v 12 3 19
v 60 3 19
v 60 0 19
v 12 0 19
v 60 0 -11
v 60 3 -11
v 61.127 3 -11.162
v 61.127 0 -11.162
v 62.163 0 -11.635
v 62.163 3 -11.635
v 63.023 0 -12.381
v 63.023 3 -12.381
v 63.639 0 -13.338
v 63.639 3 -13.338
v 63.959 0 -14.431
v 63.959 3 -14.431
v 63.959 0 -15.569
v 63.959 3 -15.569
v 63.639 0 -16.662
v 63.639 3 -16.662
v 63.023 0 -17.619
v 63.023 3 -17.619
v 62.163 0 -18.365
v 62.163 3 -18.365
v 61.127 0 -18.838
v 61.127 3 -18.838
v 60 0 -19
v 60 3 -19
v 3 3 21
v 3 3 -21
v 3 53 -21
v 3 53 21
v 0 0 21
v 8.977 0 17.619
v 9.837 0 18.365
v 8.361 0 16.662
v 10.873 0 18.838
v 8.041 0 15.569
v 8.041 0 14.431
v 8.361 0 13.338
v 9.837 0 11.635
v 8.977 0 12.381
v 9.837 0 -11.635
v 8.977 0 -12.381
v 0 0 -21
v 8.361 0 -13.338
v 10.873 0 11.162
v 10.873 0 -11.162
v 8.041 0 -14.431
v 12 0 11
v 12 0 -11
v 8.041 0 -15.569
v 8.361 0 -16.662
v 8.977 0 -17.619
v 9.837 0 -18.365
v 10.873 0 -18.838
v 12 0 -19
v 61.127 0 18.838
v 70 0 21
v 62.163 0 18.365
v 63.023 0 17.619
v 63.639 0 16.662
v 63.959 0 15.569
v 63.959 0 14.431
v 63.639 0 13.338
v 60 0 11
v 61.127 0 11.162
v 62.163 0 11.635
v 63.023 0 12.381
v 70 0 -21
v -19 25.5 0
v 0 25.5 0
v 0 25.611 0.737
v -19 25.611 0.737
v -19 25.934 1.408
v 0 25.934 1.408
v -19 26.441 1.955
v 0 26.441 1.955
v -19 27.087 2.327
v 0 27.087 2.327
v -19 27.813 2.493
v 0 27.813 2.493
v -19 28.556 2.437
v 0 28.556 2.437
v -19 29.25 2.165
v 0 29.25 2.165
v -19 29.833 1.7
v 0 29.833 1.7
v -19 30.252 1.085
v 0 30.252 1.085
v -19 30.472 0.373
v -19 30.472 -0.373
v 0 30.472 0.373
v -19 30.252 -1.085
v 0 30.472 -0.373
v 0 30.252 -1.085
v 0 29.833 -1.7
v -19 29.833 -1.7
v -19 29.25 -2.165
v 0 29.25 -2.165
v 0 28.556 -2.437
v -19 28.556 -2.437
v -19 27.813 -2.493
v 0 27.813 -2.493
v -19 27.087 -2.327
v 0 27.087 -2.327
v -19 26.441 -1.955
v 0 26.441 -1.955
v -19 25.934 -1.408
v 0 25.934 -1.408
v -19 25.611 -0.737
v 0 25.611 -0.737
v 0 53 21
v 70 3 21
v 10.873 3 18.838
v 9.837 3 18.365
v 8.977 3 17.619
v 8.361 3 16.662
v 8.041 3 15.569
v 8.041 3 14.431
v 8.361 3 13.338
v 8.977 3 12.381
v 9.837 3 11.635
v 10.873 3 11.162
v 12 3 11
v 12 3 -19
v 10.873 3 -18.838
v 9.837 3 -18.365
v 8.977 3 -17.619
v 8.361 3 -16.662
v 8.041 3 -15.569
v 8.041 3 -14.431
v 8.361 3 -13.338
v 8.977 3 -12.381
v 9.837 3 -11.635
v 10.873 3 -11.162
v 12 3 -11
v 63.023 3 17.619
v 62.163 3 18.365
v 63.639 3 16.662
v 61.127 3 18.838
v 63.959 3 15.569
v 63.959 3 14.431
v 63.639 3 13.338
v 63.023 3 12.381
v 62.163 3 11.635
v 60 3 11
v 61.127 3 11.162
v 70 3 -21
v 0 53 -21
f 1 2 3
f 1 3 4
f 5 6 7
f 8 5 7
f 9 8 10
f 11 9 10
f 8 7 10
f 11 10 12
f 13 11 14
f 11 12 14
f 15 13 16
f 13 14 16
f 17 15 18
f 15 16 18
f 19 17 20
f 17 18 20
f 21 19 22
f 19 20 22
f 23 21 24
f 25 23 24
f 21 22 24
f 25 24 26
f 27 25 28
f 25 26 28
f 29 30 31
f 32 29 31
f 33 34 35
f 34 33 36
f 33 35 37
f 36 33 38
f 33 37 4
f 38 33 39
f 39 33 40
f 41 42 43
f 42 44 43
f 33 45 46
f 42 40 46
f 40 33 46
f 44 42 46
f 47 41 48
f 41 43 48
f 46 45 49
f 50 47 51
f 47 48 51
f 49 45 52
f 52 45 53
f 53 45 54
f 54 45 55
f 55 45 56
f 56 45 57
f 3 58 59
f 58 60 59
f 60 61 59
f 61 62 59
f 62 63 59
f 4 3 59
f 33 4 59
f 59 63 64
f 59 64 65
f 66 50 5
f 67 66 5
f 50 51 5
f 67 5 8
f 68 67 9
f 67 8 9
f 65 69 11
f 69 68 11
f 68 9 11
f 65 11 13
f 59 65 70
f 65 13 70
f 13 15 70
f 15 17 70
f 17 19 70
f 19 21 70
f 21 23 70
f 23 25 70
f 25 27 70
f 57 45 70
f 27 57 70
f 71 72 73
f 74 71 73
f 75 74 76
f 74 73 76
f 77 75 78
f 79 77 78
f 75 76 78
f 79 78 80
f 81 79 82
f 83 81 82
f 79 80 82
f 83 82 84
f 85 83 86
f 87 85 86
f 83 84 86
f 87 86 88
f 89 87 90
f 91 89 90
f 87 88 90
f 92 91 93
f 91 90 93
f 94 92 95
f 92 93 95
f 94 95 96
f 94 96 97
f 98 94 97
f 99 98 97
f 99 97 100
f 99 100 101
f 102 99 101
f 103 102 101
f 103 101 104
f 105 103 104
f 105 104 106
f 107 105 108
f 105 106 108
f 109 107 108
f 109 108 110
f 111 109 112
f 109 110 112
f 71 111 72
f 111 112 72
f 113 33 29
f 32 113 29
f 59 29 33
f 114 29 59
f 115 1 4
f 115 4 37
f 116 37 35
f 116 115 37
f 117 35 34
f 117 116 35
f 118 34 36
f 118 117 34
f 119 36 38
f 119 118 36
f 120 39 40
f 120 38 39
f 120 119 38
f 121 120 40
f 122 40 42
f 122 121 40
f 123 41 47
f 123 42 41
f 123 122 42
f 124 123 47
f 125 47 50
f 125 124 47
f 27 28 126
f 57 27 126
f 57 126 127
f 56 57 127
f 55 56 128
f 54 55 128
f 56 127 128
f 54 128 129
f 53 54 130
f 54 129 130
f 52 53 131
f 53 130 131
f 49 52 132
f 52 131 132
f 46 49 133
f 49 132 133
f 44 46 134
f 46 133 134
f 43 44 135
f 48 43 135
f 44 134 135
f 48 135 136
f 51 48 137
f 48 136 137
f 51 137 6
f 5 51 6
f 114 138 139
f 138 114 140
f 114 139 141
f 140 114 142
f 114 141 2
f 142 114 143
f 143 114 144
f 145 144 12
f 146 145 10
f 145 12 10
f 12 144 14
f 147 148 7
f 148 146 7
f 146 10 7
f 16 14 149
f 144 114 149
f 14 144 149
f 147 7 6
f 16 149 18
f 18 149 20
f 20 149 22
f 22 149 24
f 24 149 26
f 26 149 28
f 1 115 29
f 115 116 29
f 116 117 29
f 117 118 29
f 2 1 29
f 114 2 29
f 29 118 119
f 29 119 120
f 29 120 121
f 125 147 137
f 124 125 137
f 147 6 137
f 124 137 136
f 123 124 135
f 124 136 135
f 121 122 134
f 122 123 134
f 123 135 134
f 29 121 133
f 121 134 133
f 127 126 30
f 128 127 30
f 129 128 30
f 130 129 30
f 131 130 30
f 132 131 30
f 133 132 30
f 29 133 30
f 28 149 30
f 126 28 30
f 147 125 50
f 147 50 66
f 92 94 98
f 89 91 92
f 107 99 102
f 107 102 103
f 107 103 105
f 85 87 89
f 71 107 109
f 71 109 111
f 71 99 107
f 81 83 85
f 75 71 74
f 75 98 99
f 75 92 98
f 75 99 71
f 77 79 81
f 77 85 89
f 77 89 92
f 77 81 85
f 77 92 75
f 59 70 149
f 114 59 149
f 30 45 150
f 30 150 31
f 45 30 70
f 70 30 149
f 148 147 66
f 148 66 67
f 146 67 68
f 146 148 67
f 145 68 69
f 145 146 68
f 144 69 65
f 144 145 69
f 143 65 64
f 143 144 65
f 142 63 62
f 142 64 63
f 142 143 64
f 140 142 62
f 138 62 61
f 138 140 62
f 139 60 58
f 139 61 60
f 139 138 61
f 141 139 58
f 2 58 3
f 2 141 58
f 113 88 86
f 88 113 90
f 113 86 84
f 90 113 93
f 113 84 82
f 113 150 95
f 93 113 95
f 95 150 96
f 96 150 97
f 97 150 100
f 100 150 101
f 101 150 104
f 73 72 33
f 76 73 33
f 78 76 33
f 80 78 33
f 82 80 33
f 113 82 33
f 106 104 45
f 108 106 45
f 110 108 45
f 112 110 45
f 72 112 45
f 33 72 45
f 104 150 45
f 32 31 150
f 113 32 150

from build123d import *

# Parameters (mm, degrees)
EXTRUDE_1_DEPTH      = 21
EXTRUDE_1_DEPTH_BACK = 21
CUT_EXTRUDE_1_REACH  = 90.549
SKETCH_3_R           = 2.5
EXTRUDE_2_DEPTH      = 19


with BuildPart() as part:
    # 草图1 → 凸台-拉伸1 (new, two sides: drawn at the far end of the back side and taken through both)
    with BuildSketch(Plane.XY.offset(-EXTRUDE_1_DEPTH_BACK)):
        Polygon((0, 53), (0, 0), (70, 0), (70, 3), (3, 3), (3, 53), align=None)
    extrude(amount=EXTRUDE_1_DEPTH + EXTRUDE_1_DEPTH_BACK)

    # 草图2 → 切除-拉伸1 (cut, up to next)
    with BuildSketch(Plane(origin=(0, 3, 0), x_dir=(1, 0, 0), z_dir=(0, 1, 0)), mode=Mode.PRIVATE) as cut_extrude_1_sk1:
        with BuildLine():
            Line((12, -11), (60, -11))
            ThreePointArc((60, -11), (64, -15), (60, -19))
            Line((60, -19), (12, -19))
            ThreePointArc((12, -19), (8, -15), (12, -11))
        make_face()
    cut_extrude_1_tool1 = extrude(cut_extrude_1_sk1.sketch, amount=-CUT_EXTRUDE_1_REACH, mode=Mode.PRIVATE) & part.part
    # 草图2 → 切除-拉伸1 (cut, up to next)
    with BuildSketch(Plane(origin=(0, 3, 0), x_dir=(1, 0, 0), z_dir=(0, 1, 0)), mode=Mode.PRIVATE) as cut_extrude_1_sk2:
        with BuildLine():
            Line((12, 11), (60, 11))
            ThreePointArc((60, 11), (64, 15), (60, 19))
            Line((60, 19), (12, 19))
            ThreePointArc((12, 19), (8, 15), (12, 11))
        make_face()
    cut_extrude_1_tool2 = extrude(cut_extrude_1_sk2.sketch, amount=-CUT_EXTRUDE_1_REACH, mode=Mode.PRIVATE) & part.part
    add(cut_extrude_1_tool1.solids().sort_by_distance((36, 3, 15))[0], mode=Mode.SUBTRACT)
    add(cut_extrude_1_tool2.solids().sort_by_distance((36, 3, -15))[0], mode=Mode.SUBTRACT)

    # 草图3 → 凸台-拉伸2 (add)
    with BuildSketch(Plane.ZY):
        with Locations((0, 28)):
            Circle(SKETCH_3_R)
    extrude(amount=EXTRUDE_2_DEPTH)


solid = part.part
